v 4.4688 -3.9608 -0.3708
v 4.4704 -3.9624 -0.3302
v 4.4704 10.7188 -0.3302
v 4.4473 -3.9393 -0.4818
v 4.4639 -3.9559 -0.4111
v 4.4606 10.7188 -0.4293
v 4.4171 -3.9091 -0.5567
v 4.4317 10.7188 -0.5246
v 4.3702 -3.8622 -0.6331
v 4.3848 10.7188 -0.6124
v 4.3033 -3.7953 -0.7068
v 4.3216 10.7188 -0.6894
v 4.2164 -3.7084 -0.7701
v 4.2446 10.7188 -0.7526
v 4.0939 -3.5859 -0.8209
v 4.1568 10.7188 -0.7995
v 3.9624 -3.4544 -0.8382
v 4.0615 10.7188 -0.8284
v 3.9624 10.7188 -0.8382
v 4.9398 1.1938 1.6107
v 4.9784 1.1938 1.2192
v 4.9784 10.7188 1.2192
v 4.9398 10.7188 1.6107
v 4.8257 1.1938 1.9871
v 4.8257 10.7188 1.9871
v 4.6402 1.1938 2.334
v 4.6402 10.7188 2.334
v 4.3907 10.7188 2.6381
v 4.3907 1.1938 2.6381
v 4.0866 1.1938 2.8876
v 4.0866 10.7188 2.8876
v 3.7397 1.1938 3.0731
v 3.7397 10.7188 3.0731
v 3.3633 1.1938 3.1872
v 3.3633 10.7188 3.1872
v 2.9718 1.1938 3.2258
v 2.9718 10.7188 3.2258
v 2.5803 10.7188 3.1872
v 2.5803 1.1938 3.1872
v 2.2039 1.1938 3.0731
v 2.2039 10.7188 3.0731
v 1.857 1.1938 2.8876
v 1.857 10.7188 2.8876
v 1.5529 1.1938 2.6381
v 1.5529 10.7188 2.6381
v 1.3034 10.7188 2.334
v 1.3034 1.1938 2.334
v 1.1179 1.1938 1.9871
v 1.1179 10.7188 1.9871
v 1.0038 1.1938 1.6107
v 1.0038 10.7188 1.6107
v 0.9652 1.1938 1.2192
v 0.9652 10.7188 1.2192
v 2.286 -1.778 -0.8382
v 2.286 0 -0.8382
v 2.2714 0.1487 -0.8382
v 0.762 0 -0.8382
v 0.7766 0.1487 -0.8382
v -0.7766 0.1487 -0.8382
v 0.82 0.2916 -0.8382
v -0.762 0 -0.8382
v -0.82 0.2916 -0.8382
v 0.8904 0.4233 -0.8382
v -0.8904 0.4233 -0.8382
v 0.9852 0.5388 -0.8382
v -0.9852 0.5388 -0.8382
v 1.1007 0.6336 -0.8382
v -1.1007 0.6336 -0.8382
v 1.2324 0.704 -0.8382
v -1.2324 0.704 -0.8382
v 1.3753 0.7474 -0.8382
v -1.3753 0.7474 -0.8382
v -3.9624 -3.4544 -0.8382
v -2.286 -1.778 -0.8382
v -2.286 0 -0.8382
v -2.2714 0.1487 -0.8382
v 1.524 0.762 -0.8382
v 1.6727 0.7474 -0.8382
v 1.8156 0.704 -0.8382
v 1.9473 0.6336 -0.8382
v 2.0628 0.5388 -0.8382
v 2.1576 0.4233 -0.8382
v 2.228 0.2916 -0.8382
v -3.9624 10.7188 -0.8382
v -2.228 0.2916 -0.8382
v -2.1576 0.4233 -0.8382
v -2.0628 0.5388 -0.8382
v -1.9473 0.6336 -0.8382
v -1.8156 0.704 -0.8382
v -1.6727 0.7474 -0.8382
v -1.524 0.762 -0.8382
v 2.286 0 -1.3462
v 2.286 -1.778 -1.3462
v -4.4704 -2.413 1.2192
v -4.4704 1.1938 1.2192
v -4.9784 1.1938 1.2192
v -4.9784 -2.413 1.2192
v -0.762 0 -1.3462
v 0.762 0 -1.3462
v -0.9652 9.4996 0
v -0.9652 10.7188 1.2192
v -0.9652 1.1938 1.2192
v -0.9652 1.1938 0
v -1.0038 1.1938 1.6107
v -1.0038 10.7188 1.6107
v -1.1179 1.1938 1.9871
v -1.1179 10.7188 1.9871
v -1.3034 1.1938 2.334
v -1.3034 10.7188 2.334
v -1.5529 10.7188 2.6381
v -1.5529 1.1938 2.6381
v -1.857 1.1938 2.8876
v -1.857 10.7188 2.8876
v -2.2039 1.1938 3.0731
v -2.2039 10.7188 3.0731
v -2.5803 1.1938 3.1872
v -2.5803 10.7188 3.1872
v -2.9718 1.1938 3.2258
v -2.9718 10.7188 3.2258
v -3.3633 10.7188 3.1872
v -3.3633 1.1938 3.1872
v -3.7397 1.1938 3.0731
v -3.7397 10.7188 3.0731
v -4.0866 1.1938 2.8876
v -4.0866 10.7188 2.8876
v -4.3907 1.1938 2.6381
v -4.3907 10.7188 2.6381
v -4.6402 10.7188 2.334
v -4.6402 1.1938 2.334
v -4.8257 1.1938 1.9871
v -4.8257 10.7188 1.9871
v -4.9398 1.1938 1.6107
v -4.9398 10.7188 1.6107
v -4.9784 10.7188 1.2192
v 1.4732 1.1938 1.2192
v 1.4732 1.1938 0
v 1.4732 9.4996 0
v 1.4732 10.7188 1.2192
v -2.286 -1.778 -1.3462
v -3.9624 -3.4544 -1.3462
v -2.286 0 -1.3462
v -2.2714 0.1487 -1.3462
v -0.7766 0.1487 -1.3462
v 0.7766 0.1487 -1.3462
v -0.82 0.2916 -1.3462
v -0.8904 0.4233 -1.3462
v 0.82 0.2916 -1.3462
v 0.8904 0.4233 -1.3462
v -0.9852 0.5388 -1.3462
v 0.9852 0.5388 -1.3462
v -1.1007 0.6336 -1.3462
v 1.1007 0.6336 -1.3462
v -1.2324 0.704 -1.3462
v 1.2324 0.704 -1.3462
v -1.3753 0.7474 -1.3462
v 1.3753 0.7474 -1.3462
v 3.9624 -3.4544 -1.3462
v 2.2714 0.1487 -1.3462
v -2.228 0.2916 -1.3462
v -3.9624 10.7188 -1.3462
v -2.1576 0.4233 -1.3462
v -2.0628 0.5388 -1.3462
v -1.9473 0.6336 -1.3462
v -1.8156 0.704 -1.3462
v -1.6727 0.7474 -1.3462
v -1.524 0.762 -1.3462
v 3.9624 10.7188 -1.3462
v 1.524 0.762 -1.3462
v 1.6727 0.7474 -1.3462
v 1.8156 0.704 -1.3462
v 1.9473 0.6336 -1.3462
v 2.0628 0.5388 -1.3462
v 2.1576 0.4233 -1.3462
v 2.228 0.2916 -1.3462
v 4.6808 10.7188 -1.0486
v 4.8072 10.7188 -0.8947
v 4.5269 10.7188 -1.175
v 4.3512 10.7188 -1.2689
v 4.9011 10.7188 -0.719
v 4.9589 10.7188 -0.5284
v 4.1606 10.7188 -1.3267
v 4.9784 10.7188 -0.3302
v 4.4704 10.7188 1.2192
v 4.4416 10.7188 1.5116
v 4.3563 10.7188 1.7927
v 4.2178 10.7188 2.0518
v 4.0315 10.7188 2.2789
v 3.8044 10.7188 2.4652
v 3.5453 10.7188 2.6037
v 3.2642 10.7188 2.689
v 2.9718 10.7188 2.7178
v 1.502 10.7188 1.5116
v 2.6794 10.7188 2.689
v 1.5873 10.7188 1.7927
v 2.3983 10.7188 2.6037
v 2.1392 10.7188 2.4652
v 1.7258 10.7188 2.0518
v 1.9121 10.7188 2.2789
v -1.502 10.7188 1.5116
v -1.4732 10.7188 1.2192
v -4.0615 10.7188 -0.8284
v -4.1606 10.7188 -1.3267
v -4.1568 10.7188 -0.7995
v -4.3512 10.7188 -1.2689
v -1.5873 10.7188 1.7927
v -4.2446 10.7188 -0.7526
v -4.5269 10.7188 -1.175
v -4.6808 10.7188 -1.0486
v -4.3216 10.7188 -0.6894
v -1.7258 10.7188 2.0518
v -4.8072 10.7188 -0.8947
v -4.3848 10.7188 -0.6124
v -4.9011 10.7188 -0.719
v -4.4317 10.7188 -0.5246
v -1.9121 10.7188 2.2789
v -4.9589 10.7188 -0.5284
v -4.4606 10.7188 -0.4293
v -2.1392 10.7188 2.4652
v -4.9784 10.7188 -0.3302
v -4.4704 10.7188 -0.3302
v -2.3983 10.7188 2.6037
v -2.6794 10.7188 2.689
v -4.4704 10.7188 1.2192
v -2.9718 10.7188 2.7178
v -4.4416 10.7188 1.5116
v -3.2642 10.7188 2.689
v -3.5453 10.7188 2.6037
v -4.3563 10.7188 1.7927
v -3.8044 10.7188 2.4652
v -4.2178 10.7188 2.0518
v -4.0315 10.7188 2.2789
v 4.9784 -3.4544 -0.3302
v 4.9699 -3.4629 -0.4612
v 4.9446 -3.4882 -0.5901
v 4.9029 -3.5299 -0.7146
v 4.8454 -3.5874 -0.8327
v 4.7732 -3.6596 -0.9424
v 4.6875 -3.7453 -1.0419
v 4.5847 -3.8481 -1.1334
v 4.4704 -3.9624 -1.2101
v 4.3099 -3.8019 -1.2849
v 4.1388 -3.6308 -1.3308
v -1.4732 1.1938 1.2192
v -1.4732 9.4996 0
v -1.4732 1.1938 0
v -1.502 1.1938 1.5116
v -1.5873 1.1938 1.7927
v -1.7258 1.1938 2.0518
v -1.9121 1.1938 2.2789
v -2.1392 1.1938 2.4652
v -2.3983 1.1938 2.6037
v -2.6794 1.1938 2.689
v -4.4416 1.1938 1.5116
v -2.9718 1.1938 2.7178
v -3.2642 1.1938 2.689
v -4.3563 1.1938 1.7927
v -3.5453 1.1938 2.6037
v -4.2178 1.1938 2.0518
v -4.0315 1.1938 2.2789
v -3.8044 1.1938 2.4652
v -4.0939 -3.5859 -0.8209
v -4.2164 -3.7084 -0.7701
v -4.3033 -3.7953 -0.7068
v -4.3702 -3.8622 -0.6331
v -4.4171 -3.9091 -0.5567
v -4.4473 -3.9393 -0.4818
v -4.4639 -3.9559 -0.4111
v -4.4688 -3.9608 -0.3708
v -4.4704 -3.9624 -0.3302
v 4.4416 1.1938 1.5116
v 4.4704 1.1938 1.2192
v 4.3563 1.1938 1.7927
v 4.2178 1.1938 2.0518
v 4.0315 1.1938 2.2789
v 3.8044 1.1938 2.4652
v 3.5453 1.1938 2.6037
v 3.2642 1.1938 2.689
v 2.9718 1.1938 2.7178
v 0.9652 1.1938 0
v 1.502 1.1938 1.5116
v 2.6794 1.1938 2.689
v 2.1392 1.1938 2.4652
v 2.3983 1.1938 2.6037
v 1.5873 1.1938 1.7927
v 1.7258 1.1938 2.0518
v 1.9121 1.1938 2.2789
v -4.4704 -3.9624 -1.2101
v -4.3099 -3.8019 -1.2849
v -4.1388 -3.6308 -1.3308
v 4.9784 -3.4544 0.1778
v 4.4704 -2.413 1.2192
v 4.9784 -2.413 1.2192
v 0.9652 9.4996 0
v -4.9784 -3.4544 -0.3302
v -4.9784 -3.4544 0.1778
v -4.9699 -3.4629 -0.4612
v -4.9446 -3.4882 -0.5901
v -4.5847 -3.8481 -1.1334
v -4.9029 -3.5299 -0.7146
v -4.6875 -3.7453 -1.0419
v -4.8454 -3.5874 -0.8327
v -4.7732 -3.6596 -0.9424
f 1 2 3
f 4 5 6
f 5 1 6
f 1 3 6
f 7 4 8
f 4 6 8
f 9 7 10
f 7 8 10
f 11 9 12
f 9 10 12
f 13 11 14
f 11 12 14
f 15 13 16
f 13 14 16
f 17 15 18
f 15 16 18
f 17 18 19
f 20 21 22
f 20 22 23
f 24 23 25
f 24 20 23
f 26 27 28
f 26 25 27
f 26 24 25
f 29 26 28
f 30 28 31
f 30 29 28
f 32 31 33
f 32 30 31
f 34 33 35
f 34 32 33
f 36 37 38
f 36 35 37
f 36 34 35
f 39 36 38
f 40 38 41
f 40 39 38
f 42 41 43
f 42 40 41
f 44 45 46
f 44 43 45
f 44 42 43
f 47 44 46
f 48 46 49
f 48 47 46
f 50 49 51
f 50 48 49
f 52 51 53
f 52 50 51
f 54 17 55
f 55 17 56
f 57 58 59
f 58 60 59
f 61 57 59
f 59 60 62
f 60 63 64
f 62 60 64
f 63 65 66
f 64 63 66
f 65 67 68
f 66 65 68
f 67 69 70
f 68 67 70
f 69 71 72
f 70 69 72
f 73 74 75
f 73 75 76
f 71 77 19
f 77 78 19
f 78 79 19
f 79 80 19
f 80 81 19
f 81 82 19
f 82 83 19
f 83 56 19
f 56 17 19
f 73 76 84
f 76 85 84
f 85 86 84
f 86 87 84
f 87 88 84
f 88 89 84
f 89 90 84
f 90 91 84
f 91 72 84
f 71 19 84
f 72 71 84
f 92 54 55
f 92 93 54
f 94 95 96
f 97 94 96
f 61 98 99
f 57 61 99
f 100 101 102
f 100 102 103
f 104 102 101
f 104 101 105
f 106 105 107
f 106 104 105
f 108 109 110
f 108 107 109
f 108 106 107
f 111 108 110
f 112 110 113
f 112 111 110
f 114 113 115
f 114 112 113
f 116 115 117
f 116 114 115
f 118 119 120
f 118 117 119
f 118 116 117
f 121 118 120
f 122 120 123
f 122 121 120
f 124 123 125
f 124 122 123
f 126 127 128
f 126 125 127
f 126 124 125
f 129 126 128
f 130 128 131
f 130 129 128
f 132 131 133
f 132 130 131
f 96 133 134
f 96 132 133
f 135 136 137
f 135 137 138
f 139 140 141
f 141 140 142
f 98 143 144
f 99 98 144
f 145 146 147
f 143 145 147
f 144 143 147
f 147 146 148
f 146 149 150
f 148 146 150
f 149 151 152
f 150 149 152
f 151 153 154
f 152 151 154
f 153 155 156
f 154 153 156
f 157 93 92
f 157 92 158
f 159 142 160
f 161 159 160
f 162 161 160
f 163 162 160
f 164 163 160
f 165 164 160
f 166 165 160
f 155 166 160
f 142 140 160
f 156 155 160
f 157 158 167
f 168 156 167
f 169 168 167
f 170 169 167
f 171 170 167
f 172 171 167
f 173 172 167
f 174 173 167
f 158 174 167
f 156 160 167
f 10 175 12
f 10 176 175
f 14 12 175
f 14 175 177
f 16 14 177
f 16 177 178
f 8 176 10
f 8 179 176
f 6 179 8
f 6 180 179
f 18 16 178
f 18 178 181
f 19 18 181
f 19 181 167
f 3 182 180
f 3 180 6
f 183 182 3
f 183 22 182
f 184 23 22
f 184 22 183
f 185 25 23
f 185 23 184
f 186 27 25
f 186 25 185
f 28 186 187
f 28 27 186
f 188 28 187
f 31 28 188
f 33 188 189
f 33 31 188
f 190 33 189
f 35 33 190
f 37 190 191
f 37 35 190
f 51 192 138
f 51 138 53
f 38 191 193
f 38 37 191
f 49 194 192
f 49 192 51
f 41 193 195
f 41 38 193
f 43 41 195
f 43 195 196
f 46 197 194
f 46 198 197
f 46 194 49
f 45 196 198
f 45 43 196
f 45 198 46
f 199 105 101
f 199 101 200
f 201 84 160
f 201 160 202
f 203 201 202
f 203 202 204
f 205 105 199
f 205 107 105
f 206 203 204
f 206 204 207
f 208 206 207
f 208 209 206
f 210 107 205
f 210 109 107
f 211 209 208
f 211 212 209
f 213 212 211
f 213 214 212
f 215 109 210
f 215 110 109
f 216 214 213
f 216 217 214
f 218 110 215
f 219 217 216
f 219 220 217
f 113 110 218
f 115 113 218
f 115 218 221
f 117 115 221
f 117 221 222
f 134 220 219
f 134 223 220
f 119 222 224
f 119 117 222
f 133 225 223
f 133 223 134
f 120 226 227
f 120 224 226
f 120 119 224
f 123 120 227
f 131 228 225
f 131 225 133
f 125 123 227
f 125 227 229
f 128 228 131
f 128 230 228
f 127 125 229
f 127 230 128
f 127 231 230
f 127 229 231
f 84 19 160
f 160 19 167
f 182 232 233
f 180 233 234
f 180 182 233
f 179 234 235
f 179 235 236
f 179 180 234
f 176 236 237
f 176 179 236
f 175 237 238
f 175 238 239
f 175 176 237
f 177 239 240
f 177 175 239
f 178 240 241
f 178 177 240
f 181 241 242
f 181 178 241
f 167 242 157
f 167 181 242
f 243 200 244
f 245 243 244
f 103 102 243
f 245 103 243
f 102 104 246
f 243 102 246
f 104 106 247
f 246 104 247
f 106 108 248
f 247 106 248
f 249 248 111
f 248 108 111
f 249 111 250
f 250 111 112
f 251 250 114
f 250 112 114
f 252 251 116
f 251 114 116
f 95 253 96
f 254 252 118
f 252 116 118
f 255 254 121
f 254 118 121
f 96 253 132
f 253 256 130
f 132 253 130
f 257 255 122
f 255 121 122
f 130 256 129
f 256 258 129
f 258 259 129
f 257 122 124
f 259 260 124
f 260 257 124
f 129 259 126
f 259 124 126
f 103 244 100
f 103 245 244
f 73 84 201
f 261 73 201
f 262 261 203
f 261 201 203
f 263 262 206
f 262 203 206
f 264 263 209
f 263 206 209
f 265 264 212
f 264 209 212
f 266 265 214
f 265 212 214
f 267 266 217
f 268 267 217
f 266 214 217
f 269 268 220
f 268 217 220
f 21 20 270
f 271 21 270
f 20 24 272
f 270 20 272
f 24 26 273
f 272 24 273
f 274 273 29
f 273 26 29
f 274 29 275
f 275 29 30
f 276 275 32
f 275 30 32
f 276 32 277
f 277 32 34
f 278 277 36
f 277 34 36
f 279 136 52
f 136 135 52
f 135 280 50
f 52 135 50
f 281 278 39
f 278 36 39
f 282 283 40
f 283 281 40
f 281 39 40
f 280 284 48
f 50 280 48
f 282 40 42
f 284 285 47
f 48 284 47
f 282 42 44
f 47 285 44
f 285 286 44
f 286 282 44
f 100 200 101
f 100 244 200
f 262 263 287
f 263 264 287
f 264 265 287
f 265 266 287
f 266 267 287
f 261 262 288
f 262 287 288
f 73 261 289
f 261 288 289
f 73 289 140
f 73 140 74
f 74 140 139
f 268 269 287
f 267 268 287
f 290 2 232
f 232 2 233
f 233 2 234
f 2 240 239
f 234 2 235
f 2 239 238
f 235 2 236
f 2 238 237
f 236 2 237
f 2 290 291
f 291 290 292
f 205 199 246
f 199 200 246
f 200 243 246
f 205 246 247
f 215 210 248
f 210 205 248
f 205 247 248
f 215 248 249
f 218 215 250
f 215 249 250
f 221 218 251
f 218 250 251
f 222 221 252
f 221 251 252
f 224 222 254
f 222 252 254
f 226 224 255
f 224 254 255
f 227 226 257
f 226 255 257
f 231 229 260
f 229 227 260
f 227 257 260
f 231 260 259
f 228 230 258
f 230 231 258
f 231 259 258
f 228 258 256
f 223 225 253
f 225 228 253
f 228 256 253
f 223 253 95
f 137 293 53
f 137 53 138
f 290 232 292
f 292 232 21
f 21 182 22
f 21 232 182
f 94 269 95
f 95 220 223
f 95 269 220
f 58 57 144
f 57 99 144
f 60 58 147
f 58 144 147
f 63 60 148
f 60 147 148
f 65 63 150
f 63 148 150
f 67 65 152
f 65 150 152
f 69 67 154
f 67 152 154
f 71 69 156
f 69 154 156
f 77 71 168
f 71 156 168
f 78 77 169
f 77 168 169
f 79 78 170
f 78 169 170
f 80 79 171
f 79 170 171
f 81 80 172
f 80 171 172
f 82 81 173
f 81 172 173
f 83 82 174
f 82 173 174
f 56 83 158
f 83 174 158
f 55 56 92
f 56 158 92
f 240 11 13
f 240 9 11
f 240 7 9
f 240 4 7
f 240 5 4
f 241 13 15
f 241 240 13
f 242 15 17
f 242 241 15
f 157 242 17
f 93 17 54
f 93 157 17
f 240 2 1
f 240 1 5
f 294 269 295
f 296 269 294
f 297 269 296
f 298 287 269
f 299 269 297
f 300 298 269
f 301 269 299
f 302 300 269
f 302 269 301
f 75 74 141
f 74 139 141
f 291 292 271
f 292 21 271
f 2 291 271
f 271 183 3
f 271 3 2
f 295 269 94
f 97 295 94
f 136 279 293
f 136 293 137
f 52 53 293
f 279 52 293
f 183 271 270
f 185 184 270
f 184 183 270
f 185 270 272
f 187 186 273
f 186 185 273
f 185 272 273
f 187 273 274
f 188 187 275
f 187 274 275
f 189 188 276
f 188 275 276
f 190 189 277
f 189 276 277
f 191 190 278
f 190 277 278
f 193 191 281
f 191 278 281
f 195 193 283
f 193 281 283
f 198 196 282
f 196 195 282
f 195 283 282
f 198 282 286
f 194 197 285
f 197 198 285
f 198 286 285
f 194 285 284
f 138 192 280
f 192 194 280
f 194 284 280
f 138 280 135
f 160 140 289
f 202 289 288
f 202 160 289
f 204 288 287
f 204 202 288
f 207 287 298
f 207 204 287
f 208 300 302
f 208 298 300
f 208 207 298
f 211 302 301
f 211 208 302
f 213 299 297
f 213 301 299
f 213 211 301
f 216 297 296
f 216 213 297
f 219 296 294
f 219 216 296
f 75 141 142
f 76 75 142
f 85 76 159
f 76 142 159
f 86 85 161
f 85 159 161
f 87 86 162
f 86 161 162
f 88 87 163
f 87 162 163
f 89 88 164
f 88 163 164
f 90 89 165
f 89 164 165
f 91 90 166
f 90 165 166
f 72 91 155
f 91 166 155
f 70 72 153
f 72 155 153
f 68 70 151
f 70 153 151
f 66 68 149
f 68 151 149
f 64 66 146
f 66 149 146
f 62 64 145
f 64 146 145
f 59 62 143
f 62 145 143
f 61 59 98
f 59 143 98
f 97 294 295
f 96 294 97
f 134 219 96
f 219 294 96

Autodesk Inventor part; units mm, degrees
ref_plane "YZ Plane" through (0, 0, 0) normal (1, 0, 0) x (0, 1, 0)
ref_plane "XY Plane" through (0, 0, 0) normal (0, 0, 1) x (1, 0, 0)
ref_plane "Work Plane1" through (0, 1.1938, 0) normal (0, 1, 0) x (-1, 0, 0)
sketch "Sketch1" plane through (0, 1.1938, 0) normal (0, 1, 0) x (-1, 0, 0)
  line L0 (0, 0) -> (0, -1.3462) construction
  line L1 (3.9624, -1.3462) -> (-3.9624, -1.3462)
  line L2 (4.9784, -0.3302) -> (4.9784, 1.2192)
  line L3 (-4.9784, -0.3302) -> (-4.9784, 1.2192)
  line L4 (4.9784, 3.2258) -> (0.9652, 3.2258) construction
  line L5 (0.9652, 3.2258) -> (0.9652, 1.2192) construction
  line L6 (-4.9784, 3.2258) -> (-0.9652, 3.2258) construction
  line L7 (-0.9652, 3.2258) -> (-0.9652, 1.2192) construction
  arc A0 (4.9784, 1.2192) -> (0.9652, 1.2192) centre (2.9718, 1.2192) ccw
  arc A1 (-0.9652, 1.2192) -> (-4.9784, 1.2192) centre (-2.9718, 1.2192) ccw
  line L8 (4.9784, 1.2192) -> (4.9784, 3.2258) construction
  line L9 (-4.9784, 1.2192) -> (-4.9784, 3.2258) construction
  arc A2 (3.9624, -1.3462) -> (4.9784, -0.3302) centre (3.9624, -0.3302) ccw
  arc A3 (-4.9784, -0.3302) -> (-3.9624, -1.3462) centre (-3.9624, -0.3302) ccw
  line L10 (0.9652, 1.2192) -> (0.9652, 0)
  line L11 (-0.9652, 1.2192) -> (-0.9652, 0)
  line L12 (-1.4732, 0) -> (-1.4732, 1.2192)
  arc A4 (-1.4732, 1.2192) -> (-4.4704, 1.2192) centre (-2.9718, 1.2192) ccw
  line L13 (-4.4704, 1.2192) -> (-4.4704, -0.3302)
  arc A5 (-4.4704, -0.3302) -> (-3.9624, -0.8382) centre (-3.9624, -0.3302) ccw
  line L14 (-3.9624, -0.8382) -> (3.9624, -0.8382)
  arc A6 (3.9624, -0.8382) -> (4.4704, -0.3302) centre (3.9624, -0.3302) ccw
  line L15 (4.4704, -0.3302) -> (4.4704, 1.2192)
  arc A7 (4.4704, 1.2192) -> (1.4732, 1.2192) centre (2.9718, 1.2192) ccw
  line L16 (1.4732, 1.2192) -> (1.4732, 0)
  line L17 (1.4732, 0) -> (0.9652, 0)
  line L18 (-0.9652, 0) -> (-1.4732, 0)
  line L19 (-4.9784, 1.2192) -> (-4.4704, 1.2192)
  line L20 (4.4704, 1.2192) -> (4.9784, 1.2192)
  point P0 (4.9784, -1.3462)
  point P1 (-4.9784, -1.3462)
  dimension "d1" = 1.3462
  dimension "d2" = 9.9568
  dimension "d3" = 4.572
  dimension "d4" = 4.572
  dimension "d5" = 1.9304
  dimension "d6" = 1.016
  dimension "d7" = 0.508
extrude "Extrusion1" add sketch "Sketch1" along normal blind 9.525
extrude "Extrusion2" add sketch "Sketch1" against normal blind 5.1562 contours L1 A3 L3 L19 L13 A5 L14 A6 L15 L20 L2 A2
sketch "Sketch2" plane through (3.9624, 10.7188, -1.3462) normal (0, 0, -1) x (-1, 0, 0)
  line L0 (-0.508, 0) -> (-0.508, -14.6812) construction
  line L1 (-0.508, -14.6812) -> (-1.016, -14.1732)
  line L2 (-1.016, 0) -> (-1.016, -14.6812) construction
  line L3 (-0.508, -14.6812) -> (0.2104, -14.6812) construction
  line L4 (8.4328, 0) -> (8.4328, -14.6812) construction
  line L5 (8.4328, -14.6812) -> (8.9408, -14.1732)
  line L6 (8.9408, 0) -> (8.9408, -14.6812) construction
  line L7 (8.4328, -14.6812) -> (9.1512, -14.6812) construction
  line L8 (-0.508, -14.6812) -> (1.6764, -12.4968)
  line L9 (-0.508, -14.6812) -> (2.5812, -14.6812) construction
  line L10 (8.4328, -14.6812) -> (6.2484, -12.4968)
  line L11 (8.4328, -14.6812) -> (11.522, -14.6812) construction
  arc A0 (3.2004, -10.7188) -> (1.6764, -10.7188) centre (2.4384, -10.7188) ccw
  arc A1 (6.2484, -10.7188) -> (4.7244, -10.7188) centre (5.4864, -10.7188) ccw
  line L12 (1.6764, -12.4968) -> (1.6764, -10.7188)
  line L13 (6.2484, -12.4968) -> (6.2484, -10.7188)
  line L14 (4.7244, -10.7188) -> (3.2004, -10.7188)
  line L15 (-1.016, -14.1732) -> (-2.2198, -16.6808)
  line L16 (-2.2198, -16.6808) -> (9.9774, -16.6808)
  line L17 (9.9774, -16.6808) -> (8.9408, -14.1732)
  point P0 (3.9624, -10.7188)
  dimension "d12" = 135
  dimension "d13" = 45
  dimension "d14" = 45
  dimension "d15" = 135
  dimension "d16" = 4.572
  dimension "d17" = 1.524
  dimension "d18" = 1.524
  dimension "d19" = 0.762
  dimension "d20" = 0.762
  dimension "d21" = 0
  dimension "d22" = 0
extrude "Extrusion3" cut sketch "Sketch2" against normal through all
sketch "Sketch3" plane through (4.9784, 10.7188, 1.2192) normal (1, 0, 0) x (0, 0, -1)
  line L0 (1.5494, -14.6812) -> (2.4293, -14.6812) projected
  line L1 (1.5494, -14.6812) -> (0, -13.1318)
  line L2 (0, -9.525) -> (0, -14.1732) projected
  line L3 (1.5494, -14.6812) -> (3.7406, -14.6812) construction
  line L4 (0, -13.1318) -> (-1.4703, -15.0958)
  line L5 (1.5494, 0) -> (1.5494, -14.6812) projected
  line L6 (-1.4703, -15.0958) -> (1.5494, -14.6812)
  point P0 (1.2192, -10.7188)
  dimension "d25" = 135
extrude "Extrusion4" cut sketch "Sketch3" against normal through all
chamfer "Chamfer1" distance 1.2192 angle 45 2 edges at (-1.2192, 10.7188, 0) (1.2192, 10.7188, 0)
properties part number "fuse clip"
